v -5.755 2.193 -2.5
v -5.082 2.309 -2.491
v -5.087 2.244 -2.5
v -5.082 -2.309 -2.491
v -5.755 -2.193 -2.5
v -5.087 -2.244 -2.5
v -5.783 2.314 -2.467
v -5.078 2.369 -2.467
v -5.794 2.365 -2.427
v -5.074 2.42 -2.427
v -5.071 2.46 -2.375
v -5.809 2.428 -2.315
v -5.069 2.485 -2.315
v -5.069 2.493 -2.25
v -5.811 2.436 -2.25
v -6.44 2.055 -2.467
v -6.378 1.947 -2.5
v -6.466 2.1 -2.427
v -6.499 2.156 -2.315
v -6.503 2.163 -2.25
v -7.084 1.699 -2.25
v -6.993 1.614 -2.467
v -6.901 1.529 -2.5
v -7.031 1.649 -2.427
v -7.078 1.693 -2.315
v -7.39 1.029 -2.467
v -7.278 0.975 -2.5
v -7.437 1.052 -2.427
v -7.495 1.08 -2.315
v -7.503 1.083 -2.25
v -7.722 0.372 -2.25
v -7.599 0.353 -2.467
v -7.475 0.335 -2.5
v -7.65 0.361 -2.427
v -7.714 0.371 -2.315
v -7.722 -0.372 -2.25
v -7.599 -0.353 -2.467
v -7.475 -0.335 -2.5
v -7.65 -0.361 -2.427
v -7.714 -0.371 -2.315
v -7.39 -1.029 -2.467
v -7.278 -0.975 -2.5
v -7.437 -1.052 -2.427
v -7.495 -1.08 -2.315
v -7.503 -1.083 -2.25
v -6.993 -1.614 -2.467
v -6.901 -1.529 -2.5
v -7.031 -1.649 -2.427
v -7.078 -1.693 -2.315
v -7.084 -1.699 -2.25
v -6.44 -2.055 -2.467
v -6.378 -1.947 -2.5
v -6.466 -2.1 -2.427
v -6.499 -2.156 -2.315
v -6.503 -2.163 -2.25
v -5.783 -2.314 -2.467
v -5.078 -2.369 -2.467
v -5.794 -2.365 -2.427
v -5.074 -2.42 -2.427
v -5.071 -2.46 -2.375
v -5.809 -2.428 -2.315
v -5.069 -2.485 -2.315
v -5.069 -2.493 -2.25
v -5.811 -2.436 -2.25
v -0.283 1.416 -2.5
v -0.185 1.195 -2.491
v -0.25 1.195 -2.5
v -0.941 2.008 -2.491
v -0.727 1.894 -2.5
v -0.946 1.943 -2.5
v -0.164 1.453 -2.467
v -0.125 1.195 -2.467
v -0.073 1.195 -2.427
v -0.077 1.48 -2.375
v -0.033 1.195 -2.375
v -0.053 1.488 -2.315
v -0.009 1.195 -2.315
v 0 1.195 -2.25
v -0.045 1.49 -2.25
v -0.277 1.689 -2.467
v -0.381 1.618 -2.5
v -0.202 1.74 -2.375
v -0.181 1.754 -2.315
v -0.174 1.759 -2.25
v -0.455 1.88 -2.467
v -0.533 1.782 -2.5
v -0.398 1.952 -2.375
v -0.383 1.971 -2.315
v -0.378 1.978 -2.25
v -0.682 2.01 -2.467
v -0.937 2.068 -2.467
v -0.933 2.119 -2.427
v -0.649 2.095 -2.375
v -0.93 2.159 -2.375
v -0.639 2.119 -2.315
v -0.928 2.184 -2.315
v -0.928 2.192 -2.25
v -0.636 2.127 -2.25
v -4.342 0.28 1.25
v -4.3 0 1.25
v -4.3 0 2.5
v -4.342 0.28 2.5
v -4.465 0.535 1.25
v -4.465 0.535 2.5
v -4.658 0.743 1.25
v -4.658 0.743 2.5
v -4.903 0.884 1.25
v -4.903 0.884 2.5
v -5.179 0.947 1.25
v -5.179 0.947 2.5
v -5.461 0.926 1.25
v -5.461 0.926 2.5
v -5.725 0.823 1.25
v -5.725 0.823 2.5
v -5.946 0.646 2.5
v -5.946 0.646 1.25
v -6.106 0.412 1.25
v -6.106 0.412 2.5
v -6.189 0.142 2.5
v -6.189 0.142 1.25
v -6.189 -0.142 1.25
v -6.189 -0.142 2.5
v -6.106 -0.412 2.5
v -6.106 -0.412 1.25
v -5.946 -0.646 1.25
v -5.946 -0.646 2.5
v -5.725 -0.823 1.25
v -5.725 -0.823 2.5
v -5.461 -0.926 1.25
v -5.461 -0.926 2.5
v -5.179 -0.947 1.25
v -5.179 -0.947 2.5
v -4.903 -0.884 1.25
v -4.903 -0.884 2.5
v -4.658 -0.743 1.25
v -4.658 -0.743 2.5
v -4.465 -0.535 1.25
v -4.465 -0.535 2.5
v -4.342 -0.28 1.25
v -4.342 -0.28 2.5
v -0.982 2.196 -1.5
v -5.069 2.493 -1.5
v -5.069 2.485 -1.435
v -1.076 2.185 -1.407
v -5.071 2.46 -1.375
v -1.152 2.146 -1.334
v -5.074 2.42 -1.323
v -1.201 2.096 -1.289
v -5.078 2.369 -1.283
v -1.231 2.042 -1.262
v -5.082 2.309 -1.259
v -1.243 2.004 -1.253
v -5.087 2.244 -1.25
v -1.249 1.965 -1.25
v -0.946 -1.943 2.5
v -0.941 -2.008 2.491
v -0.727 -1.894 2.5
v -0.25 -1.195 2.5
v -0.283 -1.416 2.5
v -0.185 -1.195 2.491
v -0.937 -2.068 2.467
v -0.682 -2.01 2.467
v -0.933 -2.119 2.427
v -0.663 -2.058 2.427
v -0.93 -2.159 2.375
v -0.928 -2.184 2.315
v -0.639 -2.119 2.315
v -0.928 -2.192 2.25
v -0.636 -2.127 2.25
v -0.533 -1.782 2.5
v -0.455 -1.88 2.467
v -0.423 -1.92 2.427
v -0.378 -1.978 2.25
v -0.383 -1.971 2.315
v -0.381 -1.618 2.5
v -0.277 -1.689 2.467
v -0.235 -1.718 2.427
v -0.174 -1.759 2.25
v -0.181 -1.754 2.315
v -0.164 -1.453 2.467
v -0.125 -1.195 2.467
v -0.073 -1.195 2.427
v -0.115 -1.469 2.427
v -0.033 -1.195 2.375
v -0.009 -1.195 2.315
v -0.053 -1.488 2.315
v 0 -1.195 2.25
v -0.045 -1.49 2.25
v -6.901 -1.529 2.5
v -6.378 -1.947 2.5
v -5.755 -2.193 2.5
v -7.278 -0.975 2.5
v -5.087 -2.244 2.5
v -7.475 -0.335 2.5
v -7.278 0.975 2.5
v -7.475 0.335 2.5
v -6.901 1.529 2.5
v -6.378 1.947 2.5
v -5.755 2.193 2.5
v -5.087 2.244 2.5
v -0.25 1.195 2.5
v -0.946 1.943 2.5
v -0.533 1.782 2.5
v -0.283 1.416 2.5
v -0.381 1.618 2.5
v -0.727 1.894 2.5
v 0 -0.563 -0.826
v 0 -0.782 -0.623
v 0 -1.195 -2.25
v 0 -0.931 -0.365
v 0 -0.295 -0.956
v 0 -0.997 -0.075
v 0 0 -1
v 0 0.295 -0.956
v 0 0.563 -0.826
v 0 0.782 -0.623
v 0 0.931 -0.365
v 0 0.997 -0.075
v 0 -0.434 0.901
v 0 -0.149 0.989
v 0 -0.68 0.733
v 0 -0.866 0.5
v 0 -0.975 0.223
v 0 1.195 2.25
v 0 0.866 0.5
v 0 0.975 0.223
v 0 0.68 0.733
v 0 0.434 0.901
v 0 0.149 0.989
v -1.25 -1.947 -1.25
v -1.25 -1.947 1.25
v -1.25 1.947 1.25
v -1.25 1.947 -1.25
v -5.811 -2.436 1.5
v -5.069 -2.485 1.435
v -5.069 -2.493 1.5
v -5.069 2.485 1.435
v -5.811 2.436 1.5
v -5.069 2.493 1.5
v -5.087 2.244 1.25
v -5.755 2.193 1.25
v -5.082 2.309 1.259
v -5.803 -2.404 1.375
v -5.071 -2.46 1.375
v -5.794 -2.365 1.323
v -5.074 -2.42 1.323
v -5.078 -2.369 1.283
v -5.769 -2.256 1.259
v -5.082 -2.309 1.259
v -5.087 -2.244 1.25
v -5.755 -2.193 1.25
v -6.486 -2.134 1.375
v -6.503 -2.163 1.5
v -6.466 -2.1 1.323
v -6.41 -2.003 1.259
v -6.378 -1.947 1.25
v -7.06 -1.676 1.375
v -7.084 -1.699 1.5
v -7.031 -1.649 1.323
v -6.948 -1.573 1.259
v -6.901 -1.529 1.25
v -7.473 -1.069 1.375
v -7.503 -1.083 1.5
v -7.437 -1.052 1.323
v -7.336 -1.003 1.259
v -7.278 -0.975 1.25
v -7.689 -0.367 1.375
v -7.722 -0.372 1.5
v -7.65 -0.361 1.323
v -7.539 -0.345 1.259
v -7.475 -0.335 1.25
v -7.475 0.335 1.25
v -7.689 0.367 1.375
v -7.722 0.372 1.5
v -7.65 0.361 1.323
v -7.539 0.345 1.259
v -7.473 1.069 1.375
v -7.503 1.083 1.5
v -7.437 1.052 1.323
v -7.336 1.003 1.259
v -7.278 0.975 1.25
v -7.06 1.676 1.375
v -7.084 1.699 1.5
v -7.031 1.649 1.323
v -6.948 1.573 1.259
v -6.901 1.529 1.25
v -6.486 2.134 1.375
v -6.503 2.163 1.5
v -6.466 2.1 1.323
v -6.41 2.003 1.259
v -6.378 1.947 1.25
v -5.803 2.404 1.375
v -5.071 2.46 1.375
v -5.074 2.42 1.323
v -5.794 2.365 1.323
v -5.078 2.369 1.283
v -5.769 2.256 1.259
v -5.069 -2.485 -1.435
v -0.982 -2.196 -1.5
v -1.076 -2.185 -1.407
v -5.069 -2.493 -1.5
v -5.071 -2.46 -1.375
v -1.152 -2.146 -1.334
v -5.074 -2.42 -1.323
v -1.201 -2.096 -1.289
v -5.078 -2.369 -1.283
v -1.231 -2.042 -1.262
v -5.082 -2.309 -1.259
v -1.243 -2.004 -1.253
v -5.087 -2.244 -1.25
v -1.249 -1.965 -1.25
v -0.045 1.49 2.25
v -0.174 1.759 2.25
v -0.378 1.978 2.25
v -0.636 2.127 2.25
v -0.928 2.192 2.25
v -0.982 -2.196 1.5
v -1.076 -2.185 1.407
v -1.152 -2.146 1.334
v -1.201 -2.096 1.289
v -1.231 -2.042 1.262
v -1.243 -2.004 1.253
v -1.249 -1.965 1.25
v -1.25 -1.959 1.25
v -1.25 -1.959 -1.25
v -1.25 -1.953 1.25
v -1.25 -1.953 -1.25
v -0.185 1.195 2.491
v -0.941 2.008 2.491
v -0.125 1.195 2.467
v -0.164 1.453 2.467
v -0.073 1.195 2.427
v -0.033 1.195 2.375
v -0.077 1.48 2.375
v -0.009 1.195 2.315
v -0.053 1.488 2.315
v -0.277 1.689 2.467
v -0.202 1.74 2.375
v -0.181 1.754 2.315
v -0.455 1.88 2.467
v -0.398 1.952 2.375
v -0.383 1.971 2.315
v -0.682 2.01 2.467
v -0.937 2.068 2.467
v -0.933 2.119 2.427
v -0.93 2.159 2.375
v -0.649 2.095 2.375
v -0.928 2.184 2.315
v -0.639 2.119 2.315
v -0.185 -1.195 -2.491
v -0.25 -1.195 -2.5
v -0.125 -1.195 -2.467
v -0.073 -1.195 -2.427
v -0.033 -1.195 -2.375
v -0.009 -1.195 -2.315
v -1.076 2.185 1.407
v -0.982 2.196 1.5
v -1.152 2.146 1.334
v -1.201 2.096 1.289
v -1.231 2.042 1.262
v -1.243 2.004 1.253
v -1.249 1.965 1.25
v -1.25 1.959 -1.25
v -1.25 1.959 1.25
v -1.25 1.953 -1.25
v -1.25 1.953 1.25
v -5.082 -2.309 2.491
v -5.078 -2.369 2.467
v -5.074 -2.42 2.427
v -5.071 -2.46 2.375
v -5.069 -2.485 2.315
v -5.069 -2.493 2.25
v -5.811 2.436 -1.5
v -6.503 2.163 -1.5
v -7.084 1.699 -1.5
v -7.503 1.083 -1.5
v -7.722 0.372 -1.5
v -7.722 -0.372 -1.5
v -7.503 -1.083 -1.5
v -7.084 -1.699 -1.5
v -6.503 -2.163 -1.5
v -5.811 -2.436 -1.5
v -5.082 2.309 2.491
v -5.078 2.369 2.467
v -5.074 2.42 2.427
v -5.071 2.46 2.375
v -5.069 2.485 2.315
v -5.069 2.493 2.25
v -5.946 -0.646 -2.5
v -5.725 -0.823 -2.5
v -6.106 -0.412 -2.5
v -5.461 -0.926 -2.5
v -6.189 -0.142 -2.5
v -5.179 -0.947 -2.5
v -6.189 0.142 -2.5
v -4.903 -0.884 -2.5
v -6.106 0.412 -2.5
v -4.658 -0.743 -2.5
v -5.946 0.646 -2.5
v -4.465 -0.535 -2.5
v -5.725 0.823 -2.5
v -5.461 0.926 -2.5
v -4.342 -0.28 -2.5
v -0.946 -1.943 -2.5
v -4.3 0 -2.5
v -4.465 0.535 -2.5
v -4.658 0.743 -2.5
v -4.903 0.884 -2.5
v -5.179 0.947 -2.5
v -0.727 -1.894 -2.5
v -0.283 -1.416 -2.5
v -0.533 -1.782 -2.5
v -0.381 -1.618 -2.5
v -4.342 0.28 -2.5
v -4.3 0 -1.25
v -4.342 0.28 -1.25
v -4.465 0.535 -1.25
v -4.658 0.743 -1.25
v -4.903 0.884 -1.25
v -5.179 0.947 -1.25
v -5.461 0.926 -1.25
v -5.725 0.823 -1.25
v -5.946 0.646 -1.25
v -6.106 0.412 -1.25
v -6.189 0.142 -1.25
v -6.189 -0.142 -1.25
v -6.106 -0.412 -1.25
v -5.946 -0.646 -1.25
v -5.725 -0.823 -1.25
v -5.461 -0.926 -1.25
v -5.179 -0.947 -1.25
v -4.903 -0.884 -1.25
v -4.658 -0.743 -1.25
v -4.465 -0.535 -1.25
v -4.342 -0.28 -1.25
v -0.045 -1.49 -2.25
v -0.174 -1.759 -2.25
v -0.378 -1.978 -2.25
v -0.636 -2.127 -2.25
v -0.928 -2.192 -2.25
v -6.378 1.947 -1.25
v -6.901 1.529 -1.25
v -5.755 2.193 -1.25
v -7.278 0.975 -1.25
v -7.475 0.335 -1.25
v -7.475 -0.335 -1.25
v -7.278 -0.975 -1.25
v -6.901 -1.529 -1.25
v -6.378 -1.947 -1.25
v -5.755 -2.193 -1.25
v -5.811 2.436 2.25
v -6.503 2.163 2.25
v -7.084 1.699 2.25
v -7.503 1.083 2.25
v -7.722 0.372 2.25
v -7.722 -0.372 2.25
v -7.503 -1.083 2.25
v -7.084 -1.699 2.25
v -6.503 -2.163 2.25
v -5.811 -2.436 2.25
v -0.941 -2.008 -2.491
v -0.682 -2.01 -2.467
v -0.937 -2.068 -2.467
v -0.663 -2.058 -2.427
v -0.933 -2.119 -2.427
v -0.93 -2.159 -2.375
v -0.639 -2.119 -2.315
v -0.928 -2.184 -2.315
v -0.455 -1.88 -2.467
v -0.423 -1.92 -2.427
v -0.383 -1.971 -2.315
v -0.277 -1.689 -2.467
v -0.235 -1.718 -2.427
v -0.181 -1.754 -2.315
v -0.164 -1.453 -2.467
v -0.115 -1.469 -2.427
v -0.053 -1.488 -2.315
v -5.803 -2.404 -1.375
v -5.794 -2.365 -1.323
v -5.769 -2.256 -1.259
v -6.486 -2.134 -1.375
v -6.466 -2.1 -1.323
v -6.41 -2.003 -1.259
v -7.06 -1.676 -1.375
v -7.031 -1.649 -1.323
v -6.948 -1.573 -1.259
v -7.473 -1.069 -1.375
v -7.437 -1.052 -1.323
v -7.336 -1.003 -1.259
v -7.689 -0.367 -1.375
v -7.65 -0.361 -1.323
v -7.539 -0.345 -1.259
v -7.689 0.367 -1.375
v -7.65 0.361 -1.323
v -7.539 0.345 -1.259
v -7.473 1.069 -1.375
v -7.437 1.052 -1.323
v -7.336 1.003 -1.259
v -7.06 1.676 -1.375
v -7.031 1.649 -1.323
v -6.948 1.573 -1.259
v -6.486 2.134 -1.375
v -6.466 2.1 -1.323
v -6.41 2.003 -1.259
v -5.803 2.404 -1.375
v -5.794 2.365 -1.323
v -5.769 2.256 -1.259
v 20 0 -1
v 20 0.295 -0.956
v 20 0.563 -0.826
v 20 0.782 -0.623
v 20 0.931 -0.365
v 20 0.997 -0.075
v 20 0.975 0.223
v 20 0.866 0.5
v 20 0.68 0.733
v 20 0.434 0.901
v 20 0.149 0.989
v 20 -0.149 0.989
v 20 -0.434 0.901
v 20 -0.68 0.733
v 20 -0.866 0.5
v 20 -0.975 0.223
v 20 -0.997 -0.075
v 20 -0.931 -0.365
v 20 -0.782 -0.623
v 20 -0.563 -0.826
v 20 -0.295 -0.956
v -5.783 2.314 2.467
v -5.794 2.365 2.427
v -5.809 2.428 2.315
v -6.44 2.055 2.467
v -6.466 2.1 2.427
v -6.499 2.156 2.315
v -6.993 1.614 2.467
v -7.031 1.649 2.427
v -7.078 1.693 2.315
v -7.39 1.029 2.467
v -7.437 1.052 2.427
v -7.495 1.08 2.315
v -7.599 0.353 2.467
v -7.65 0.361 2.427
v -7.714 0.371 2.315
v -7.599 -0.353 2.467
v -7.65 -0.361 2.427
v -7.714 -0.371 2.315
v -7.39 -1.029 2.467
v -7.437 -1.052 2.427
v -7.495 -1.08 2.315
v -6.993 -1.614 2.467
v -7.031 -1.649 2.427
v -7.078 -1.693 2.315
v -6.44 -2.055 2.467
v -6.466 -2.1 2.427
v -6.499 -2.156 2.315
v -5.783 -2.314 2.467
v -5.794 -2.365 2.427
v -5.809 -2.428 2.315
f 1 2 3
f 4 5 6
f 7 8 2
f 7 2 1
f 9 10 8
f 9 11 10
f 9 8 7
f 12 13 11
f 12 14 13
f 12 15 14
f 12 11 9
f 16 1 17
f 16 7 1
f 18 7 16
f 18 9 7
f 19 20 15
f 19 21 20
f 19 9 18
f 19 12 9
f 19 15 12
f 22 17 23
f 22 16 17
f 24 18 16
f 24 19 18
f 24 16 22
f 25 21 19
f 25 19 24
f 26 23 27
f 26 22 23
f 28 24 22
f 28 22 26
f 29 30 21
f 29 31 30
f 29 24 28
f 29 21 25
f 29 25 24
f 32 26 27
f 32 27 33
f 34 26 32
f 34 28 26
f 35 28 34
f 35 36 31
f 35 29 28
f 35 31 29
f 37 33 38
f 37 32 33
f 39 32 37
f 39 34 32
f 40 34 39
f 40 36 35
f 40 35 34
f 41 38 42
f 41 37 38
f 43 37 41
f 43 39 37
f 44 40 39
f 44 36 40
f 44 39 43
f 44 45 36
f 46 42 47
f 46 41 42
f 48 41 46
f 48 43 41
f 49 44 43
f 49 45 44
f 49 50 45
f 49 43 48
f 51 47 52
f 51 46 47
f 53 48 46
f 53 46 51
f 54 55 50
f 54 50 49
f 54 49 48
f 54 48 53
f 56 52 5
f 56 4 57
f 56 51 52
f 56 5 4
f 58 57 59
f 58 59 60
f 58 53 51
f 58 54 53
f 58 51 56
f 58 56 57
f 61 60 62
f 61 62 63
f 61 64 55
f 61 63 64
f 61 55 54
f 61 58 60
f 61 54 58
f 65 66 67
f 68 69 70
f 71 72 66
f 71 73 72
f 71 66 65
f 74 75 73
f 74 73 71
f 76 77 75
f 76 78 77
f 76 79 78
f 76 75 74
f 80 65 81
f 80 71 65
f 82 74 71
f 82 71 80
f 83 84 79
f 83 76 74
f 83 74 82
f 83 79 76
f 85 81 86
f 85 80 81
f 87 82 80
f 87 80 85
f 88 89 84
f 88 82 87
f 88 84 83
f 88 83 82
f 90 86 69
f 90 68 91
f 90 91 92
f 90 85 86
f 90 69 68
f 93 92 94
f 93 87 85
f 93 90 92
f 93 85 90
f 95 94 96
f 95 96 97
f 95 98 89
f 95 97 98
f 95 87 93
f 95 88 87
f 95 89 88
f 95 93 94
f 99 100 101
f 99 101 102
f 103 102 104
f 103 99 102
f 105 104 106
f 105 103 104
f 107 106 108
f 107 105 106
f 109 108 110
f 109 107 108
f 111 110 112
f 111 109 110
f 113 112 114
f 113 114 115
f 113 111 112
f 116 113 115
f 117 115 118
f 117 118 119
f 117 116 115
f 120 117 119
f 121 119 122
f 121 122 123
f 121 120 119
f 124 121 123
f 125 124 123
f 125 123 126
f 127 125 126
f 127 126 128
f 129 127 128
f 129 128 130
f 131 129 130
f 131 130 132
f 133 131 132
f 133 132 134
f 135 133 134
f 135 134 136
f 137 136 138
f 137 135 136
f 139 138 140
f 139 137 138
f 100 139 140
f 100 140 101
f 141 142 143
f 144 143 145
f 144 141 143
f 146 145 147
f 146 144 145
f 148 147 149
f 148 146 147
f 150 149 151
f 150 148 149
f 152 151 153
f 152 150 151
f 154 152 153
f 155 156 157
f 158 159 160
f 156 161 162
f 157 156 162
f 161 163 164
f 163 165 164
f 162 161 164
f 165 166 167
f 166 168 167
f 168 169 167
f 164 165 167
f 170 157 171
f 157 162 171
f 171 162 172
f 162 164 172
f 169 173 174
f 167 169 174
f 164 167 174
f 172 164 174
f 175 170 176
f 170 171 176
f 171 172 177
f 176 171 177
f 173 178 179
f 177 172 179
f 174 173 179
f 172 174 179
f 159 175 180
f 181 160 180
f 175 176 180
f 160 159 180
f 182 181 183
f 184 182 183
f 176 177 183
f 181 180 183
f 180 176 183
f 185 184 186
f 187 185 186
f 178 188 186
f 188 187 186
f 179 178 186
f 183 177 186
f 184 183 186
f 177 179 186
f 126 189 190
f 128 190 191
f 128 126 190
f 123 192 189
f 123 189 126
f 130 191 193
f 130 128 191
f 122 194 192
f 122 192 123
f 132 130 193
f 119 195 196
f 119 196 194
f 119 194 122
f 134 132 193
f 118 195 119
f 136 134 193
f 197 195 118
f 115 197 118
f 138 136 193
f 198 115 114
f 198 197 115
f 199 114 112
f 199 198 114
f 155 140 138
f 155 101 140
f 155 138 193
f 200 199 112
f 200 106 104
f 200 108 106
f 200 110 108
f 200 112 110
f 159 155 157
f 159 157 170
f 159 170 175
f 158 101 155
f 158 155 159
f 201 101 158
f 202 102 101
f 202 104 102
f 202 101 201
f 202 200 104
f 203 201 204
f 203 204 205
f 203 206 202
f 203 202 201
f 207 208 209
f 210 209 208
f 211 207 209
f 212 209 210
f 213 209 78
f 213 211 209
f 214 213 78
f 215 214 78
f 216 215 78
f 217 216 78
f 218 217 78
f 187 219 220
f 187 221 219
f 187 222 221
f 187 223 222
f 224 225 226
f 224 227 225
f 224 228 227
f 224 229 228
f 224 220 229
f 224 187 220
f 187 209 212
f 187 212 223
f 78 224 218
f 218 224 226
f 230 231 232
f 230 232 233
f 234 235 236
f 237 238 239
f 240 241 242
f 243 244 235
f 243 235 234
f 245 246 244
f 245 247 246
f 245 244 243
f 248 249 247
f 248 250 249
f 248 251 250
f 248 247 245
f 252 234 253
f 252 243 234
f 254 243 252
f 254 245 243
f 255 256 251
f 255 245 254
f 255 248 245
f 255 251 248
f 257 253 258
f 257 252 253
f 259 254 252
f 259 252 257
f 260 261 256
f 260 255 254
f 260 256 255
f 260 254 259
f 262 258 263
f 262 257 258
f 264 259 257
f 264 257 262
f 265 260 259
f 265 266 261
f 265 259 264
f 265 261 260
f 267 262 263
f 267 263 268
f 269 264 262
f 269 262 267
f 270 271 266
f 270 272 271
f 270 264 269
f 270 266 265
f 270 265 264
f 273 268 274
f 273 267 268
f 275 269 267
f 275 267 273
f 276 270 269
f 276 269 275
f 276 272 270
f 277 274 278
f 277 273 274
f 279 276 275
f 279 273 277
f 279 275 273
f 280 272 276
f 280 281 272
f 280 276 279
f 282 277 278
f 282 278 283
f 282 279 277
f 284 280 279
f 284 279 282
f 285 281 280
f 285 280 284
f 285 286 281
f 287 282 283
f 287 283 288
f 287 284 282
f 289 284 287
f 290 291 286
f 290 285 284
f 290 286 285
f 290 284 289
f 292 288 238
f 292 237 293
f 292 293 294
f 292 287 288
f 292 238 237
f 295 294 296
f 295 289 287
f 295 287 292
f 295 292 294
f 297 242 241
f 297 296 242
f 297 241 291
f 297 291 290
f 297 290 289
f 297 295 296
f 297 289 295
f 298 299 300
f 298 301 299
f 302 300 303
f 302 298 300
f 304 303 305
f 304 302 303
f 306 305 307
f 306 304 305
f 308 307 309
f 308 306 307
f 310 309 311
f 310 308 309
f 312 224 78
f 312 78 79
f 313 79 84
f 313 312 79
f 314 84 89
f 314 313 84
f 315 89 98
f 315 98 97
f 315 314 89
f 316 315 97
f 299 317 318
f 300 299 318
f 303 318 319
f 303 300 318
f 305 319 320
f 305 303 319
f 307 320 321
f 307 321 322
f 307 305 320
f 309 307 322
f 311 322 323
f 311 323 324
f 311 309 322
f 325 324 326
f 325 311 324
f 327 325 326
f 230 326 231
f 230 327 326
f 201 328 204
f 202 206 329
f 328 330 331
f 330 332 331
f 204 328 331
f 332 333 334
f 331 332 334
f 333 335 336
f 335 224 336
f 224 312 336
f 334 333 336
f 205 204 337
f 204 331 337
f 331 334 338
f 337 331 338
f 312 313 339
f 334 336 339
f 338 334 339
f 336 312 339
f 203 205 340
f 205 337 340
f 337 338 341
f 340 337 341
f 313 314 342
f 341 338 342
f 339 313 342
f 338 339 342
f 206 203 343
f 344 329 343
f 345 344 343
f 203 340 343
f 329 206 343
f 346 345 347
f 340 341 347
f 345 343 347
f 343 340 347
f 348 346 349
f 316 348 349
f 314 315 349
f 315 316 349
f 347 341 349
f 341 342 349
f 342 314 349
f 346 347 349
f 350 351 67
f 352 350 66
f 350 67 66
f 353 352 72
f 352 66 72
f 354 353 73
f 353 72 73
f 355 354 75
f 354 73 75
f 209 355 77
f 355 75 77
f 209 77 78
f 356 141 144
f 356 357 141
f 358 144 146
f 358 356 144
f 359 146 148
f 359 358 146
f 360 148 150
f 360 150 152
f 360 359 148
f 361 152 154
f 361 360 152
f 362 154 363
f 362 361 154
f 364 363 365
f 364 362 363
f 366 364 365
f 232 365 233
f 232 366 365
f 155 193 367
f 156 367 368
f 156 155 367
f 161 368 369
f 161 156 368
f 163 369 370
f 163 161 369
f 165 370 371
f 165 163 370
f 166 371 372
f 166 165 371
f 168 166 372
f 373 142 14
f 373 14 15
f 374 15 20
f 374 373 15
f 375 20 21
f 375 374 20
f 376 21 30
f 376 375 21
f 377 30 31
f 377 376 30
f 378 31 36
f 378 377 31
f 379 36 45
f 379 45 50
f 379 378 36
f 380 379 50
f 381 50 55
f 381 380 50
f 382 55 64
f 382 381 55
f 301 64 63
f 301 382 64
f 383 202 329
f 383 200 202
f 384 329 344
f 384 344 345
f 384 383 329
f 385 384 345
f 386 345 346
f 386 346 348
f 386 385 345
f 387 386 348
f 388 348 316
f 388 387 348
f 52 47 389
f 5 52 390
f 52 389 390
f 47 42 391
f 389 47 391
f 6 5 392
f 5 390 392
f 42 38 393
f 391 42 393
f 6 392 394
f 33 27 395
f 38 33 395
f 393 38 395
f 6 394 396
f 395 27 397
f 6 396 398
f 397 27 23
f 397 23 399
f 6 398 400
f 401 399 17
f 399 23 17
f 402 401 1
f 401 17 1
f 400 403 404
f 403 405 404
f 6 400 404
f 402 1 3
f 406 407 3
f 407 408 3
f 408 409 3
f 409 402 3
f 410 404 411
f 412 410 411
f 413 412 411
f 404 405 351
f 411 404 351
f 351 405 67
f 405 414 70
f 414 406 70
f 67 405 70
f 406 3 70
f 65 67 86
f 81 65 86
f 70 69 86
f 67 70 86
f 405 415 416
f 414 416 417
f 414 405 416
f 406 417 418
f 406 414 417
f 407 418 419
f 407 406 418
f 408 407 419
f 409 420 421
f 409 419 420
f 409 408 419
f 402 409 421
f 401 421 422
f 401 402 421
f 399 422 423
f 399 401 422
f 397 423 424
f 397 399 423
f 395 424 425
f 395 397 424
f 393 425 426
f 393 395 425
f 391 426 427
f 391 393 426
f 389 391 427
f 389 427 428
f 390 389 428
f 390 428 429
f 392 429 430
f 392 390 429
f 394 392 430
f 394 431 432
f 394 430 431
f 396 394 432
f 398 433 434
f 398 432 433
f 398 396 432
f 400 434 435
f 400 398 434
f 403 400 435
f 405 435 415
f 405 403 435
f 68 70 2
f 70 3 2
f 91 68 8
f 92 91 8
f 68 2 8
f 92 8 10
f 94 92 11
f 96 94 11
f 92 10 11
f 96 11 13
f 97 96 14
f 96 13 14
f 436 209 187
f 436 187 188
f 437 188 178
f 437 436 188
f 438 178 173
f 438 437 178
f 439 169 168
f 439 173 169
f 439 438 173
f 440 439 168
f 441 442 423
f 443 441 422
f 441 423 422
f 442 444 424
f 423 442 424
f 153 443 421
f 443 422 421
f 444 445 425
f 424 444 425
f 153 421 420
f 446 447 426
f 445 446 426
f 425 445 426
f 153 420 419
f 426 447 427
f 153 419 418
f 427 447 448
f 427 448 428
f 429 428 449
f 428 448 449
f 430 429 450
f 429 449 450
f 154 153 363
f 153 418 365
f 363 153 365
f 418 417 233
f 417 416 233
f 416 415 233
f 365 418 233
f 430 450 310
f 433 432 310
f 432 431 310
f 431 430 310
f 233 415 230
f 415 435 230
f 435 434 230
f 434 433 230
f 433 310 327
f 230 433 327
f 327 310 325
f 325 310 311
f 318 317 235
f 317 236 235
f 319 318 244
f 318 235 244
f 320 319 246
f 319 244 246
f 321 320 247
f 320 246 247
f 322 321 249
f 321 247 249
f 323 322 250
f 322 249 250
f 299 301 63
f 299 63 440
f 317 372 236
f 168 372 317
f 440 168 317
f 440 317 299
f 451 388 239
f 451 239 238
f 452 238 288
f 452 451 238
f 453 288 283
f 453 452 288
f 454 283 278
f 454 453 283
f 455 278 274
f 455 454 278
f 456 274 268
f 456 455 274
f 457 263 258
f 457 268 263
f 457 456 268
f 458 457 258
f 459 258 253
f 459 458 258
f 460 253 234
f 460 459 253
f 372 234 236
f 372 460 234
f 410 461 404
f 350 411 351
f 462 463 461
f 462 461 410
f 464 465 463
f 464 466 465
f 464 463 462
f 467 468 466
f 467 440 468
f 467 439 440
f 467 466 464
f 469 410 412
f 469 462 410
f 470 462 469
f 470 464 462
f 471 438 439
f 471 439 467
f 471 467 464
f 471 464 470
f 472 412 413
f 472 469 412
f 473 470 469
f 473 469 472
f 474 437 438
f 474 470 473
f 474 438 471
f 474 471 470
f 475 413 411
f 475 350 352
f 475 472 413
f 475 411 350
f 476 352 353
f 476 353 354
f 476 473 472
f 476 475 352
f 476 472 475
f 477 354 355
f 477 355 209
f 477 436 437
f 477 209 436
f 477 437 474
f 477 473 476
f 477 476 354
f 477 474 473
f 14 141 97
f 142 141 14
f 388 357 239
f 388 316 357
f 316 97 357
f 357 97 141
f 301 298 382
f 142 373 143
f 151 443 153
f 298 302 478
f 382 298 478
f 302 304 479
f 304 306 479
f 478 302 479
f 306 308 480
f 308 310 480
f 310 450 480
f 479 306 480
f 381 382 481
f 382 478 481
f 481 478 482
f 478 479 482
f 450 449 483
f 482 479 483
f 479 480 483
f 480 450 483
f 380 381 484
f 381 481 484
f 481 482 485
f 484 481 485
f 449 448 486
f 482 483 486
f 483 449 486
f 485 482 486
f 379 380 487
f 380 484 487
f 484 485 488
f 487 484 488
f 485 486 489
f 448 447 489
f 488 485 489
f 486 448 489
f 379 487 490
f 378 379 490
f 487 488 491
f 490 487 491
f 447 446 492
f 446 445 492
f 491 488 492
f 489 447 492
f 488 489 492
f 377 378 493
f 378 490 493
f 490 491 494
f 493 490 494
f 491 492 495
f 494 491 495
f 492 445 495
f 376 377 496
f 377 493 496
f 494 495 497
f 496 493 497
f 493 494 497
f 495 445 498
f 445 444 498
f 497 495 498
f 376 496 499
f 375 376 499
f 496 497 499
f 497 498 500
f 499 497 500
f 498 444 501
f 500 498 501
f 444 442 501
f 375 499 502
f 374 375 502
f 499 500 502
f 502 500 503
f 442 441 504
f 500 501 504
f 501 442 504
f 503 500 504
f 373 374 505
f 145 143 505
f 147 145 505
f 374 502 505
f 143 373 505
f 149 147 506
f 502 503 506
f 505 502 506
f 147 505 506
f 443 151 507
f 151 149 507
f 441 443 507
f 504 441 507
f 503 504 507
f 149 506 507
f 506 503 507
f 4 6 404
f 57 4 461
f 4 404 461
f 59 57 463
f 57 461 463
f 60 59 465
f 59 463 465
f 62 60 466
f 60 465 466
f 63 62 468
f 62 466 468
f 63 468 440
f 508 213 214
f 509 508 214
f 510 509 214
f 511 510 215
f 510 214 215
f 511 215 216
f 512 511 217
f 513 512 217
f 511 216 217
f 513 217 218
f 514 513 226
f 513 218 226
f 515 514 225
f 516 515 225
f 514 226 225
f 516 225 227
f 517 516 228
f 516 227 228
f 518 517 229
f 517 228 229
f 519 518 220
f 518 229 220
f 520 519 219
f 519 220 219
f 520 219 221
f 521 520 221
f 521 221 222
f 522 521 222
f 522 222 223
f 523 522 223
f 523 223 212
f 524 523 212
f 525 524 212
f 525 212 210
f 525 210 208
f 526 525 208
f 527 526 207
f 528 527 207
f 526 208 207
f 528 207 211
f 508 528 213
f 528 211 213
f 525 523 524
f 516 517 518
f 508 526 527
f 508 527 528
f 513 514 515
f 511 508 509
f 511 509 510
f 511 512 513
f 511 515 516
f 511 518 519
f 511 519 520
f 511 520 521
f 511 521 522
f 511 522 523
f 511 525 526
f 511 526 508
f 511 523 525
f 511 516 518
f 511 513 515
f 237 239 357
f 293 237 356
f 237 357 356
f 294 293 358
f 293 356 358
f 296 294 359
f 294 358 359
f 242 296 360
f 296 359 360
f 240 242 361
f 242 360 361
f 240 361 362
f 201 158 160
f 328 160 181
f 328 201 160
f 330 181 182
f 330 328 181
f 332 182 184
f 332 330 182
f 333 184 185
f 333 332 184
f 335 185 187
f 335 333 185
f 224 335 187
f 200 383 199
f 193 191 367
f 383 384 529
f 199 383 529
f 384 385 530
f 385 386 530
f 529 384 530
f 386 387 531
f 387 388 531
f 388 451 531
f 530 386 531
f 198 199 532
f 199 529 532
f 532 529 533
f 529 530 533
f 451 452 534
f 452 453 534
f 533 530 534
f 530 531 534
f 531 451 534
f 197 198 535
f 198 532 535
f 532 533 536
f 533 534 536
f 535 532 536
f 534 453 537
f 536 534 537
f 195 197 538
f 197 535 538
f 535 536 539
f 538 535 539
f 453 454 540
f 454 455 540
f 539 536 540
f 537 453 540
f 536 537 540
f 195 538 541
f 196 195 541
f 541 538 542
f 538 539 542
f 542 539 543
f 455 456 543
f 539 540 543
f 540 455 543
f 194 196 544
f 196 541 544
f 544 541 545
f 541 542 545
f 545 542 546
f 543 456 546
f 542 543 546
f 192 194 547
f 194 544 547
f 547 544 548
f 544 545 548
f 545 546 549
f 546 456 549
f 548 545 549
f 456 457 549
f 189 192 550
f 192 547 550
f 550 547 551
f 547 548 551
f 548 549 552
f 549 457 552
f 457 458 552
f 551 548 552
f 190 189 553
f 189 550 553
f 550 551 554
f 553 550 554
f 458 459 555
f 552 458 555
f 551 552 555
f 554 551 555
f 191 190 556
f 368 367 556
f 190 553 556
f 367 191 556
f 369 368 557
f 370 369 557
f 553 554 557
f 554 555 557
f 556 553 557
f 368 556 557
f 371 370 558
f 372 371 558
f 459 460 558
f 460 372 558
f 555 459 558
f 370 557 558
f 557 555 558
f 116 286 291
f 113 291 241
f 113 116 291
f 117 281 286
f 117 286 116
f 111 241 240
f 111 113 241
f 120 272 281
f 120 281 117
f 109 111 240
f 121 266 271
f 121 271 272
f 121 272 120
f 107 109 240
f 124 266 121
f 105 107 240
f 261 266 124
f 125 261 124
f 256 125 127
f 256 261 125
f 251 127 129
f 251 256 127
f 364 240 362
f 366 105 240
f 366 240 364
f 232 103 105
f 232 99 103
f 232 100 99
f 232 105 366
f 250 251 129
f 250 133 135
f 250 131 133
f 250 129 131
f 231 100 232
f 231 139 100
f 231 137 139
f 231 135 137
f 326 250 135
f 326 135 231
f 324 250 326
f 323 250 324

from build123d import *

# Parameters (mm, degrees)
SKETCH1_R               = 1
BOSS_EXTRUDE1_DEPTH     = 20
SKETCH2_R               = 0.95
BOSS_EXTRUDE2_DEPTH     = 2.5
CUT_EXTRUDE1_DEPTH      = 21.310096012
CUT_EXTRUDE1_DEPTH_BACK = 21.310096012
SKETCH3_W               = 6.5
SKETCH3_H               = 2.5
FILLET1_R               = 1
FILLET2_R               = 0.25


with BuildPart() as part:
    # Sketch1 → Boss-Extrude1 (new body)
    with BuildSketch(Plane(origin=(0, 0, 0), x_dir=(0, 0, -1), z_dir=(1, 0, 0))):
        Circle(SKETCH1_R)
    extrude(amount=BOSS_EXTRUDE1_DEPTH)

    # Sketch2 → Boss-Extrude2 (add, symmetric)
    with BuildSketch(Plane.XY):
        with BuildLine():
            Line((0, -2.125), (0, 2.125))
            Line((0, 2.125), (-5.06876613, 2.493422203))
            ThreePointArc((-5.06876613, 2.493422203), (-7.75, 0), (-5.06876613, -2.493422203))
            Line((-5.06876613, -2.493422203), (0, -2.125))
        make_face()
        with Locations((-5.25, 0)):
            Circle(SKETCH2_R, mode=Mode.SUBTRACT)
    extrude(amount=BOSS_EXTRUDE2_DEPTH, both=True)

    # Sketch3 → Cut-Extrude1 (cut, two sides: drawn at the far end of the back side and taken through both)
    with BuildSketch(Plane(origin=(0, 0, 0), x_dir=(1, 0, 0), z_dir=(0, 1, 0)).offset(-CUT_EXTRUDE1_DEPTH_BACK)):
        with Locations((-4.5, 0)):
            Rectangle(SKETCH3_W, SKETCH3_H)
    extrude(amount=CUT_EXTRUDE1_DEPTH + CUT_EXTRUDE1_DEPTH_BACK, mode=Mode.SUBTRACT)

    # Fillet1
    fillet1_edges = [part.edges().sort_by_distance(p)[0] for p in [
        (0, -2.125, 0),
        (0, 2.125, 0),
    ]]
    fillet(fillet1_edges, radius=FILLET1_R)

    # Fillet2
    fillet2_edges = [part.edges().sort_by_distance(p)[0] for p in [
        (-1.25, 2.215855988, 0),
        (-1.25, -2.215855988, 0),
        (-7.75, 0, -1.25),
        (-3.159383065, 2.354639096, -1.25),
        (-3.159383065, -2.354639096, -1.25),
        (-7.75, 0, 1.25),
        (-3.159383065, -2.354639096, 1.25),
        (-3.159383065, 2.354639096, 1.25),
        (-2.998136291, 2.342918908, 2.5),
        (-2.998136291, 2.342918908, -2.5),
        (-2.998136291, -2.342918908, 2.5),
        (0, 0, -2.5),
        (-0.267711277, -1.876041023, -2.5),
        (-0.267711277, 1.876041023, -2.5),
        (0, 0, 2.5),
        (-0.267711277, -1.876041023, 2.5),
        (-0.267711277, 1.876041023, 2.5),
        (-7.75, 0, 2.5),
        (-2.998136291, -2.342918908, -2.5),
        (-7.75, 0, -2.5),
    ]]
    fillet(fillet2_edges, radius=FILLET2_R)


solid = part.part
